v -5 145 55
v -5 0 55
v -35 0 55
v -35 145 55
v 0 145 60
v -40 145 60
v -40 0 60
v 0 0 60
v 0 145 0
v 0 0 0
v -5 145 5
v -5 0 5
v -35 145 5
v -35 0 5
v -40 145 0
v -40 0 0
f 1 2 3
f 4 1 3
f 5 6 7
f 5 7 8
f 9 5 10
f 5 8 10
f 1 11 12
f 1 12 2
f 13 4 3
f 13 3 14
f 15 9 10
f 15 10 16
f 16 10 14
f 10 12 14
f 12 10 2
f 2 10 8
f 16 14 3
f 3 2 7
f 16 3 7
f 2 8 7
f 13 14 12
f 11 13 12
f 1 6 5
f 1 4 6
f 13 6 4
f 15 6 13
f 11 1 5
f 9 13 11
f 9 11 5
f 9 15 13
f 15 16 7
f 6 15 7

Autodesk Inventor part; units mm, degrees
ref_plane "YZ Plane" through (0, 0, 0) normal (1, 0, 0) x (0, 1, 0)
ref_plane "XZ Plane" through (0, 0, 0) normal (0, 1, 0) x (-1, 0, 0)
ref_plane "XY Plane" through (0, 0, 0) normal (0, 0, 1) x (1, 0, 0)
sketch "Эскиз1" plane through (0, 0, 0) normal (0, 1, 0) x (-1, 0, 0)
  line L0 (0, 0) -> (40, 0)
  line L1 (40, 0) -> (40, 60)
  line L2 (40, 60) -> (0, 60)
  line L3 (0, 60) -> (0, 0)
  dimension "d0" = 60
  dimension "d1" = 40
extrude "Выдавливание1" add sketch "Эскиз1" along normal blind 190
sketch "Эскиз2" plane through (0, 190, 0) normal (0, 1, 0) x (1, 0, 0)
  line L0 (-35, -5) -> (-5, -5)
  line L1 (-5, -5) -> (-5, -55)
  line L2 (-5, -55) -> (-35, -55)
  line L3 (-35, -55) -> (-35, -5)
  line L4 (-40, 0) -> (-40, -60) projected
  line L5 (0, -60) -> (0, 0) projected
  line L6 (0, 0) -> (-40, 0) projected
  line L7 (-40, -60) -> (0, -60) projected
  dimension "d4" = 5
  dimension "d5" = 5
  dimension "d6" = 5
  dimension "d7" = 5
extrude "Выдавливание2" cut sketch "Эскиз2" against normal through all contours L0 L1 L2 L3
sketch "Эскиз3" plane through (-40, 0, 60) normal (0, 0, 1) x (1, 0, 0)
  point P0 (40, 0)
sketch "Эскиз5" plane through (0, 190, 0) normal (0, 1, 0) x (1, 0, 0)
  line L0 (-5, -5) -> (-5, -55) projected
  line L1 (-5, -55) -> (-35, -55) projected
  line L2 (-35, -55) -> (-35, -5) projected
  line L3 (-35, -5) -> (-5, -5) projected
  line L4 (-40, 0) -> (-40, -60) projected
  line L5 (-40, -60) -> (0, -60) projected
  line L6 (0, -60) -> (0, 0) projected
  line L7 (0, 0) -> (-40, 0) projected
extrude "Выдавливание4" cut sketch "Эскиз5" against normal blind 45
equation "\"d5\" = d4"
equation "\"d6\" = d4"
equation "\"d7\" = d4"
properties part number "БРУС"
